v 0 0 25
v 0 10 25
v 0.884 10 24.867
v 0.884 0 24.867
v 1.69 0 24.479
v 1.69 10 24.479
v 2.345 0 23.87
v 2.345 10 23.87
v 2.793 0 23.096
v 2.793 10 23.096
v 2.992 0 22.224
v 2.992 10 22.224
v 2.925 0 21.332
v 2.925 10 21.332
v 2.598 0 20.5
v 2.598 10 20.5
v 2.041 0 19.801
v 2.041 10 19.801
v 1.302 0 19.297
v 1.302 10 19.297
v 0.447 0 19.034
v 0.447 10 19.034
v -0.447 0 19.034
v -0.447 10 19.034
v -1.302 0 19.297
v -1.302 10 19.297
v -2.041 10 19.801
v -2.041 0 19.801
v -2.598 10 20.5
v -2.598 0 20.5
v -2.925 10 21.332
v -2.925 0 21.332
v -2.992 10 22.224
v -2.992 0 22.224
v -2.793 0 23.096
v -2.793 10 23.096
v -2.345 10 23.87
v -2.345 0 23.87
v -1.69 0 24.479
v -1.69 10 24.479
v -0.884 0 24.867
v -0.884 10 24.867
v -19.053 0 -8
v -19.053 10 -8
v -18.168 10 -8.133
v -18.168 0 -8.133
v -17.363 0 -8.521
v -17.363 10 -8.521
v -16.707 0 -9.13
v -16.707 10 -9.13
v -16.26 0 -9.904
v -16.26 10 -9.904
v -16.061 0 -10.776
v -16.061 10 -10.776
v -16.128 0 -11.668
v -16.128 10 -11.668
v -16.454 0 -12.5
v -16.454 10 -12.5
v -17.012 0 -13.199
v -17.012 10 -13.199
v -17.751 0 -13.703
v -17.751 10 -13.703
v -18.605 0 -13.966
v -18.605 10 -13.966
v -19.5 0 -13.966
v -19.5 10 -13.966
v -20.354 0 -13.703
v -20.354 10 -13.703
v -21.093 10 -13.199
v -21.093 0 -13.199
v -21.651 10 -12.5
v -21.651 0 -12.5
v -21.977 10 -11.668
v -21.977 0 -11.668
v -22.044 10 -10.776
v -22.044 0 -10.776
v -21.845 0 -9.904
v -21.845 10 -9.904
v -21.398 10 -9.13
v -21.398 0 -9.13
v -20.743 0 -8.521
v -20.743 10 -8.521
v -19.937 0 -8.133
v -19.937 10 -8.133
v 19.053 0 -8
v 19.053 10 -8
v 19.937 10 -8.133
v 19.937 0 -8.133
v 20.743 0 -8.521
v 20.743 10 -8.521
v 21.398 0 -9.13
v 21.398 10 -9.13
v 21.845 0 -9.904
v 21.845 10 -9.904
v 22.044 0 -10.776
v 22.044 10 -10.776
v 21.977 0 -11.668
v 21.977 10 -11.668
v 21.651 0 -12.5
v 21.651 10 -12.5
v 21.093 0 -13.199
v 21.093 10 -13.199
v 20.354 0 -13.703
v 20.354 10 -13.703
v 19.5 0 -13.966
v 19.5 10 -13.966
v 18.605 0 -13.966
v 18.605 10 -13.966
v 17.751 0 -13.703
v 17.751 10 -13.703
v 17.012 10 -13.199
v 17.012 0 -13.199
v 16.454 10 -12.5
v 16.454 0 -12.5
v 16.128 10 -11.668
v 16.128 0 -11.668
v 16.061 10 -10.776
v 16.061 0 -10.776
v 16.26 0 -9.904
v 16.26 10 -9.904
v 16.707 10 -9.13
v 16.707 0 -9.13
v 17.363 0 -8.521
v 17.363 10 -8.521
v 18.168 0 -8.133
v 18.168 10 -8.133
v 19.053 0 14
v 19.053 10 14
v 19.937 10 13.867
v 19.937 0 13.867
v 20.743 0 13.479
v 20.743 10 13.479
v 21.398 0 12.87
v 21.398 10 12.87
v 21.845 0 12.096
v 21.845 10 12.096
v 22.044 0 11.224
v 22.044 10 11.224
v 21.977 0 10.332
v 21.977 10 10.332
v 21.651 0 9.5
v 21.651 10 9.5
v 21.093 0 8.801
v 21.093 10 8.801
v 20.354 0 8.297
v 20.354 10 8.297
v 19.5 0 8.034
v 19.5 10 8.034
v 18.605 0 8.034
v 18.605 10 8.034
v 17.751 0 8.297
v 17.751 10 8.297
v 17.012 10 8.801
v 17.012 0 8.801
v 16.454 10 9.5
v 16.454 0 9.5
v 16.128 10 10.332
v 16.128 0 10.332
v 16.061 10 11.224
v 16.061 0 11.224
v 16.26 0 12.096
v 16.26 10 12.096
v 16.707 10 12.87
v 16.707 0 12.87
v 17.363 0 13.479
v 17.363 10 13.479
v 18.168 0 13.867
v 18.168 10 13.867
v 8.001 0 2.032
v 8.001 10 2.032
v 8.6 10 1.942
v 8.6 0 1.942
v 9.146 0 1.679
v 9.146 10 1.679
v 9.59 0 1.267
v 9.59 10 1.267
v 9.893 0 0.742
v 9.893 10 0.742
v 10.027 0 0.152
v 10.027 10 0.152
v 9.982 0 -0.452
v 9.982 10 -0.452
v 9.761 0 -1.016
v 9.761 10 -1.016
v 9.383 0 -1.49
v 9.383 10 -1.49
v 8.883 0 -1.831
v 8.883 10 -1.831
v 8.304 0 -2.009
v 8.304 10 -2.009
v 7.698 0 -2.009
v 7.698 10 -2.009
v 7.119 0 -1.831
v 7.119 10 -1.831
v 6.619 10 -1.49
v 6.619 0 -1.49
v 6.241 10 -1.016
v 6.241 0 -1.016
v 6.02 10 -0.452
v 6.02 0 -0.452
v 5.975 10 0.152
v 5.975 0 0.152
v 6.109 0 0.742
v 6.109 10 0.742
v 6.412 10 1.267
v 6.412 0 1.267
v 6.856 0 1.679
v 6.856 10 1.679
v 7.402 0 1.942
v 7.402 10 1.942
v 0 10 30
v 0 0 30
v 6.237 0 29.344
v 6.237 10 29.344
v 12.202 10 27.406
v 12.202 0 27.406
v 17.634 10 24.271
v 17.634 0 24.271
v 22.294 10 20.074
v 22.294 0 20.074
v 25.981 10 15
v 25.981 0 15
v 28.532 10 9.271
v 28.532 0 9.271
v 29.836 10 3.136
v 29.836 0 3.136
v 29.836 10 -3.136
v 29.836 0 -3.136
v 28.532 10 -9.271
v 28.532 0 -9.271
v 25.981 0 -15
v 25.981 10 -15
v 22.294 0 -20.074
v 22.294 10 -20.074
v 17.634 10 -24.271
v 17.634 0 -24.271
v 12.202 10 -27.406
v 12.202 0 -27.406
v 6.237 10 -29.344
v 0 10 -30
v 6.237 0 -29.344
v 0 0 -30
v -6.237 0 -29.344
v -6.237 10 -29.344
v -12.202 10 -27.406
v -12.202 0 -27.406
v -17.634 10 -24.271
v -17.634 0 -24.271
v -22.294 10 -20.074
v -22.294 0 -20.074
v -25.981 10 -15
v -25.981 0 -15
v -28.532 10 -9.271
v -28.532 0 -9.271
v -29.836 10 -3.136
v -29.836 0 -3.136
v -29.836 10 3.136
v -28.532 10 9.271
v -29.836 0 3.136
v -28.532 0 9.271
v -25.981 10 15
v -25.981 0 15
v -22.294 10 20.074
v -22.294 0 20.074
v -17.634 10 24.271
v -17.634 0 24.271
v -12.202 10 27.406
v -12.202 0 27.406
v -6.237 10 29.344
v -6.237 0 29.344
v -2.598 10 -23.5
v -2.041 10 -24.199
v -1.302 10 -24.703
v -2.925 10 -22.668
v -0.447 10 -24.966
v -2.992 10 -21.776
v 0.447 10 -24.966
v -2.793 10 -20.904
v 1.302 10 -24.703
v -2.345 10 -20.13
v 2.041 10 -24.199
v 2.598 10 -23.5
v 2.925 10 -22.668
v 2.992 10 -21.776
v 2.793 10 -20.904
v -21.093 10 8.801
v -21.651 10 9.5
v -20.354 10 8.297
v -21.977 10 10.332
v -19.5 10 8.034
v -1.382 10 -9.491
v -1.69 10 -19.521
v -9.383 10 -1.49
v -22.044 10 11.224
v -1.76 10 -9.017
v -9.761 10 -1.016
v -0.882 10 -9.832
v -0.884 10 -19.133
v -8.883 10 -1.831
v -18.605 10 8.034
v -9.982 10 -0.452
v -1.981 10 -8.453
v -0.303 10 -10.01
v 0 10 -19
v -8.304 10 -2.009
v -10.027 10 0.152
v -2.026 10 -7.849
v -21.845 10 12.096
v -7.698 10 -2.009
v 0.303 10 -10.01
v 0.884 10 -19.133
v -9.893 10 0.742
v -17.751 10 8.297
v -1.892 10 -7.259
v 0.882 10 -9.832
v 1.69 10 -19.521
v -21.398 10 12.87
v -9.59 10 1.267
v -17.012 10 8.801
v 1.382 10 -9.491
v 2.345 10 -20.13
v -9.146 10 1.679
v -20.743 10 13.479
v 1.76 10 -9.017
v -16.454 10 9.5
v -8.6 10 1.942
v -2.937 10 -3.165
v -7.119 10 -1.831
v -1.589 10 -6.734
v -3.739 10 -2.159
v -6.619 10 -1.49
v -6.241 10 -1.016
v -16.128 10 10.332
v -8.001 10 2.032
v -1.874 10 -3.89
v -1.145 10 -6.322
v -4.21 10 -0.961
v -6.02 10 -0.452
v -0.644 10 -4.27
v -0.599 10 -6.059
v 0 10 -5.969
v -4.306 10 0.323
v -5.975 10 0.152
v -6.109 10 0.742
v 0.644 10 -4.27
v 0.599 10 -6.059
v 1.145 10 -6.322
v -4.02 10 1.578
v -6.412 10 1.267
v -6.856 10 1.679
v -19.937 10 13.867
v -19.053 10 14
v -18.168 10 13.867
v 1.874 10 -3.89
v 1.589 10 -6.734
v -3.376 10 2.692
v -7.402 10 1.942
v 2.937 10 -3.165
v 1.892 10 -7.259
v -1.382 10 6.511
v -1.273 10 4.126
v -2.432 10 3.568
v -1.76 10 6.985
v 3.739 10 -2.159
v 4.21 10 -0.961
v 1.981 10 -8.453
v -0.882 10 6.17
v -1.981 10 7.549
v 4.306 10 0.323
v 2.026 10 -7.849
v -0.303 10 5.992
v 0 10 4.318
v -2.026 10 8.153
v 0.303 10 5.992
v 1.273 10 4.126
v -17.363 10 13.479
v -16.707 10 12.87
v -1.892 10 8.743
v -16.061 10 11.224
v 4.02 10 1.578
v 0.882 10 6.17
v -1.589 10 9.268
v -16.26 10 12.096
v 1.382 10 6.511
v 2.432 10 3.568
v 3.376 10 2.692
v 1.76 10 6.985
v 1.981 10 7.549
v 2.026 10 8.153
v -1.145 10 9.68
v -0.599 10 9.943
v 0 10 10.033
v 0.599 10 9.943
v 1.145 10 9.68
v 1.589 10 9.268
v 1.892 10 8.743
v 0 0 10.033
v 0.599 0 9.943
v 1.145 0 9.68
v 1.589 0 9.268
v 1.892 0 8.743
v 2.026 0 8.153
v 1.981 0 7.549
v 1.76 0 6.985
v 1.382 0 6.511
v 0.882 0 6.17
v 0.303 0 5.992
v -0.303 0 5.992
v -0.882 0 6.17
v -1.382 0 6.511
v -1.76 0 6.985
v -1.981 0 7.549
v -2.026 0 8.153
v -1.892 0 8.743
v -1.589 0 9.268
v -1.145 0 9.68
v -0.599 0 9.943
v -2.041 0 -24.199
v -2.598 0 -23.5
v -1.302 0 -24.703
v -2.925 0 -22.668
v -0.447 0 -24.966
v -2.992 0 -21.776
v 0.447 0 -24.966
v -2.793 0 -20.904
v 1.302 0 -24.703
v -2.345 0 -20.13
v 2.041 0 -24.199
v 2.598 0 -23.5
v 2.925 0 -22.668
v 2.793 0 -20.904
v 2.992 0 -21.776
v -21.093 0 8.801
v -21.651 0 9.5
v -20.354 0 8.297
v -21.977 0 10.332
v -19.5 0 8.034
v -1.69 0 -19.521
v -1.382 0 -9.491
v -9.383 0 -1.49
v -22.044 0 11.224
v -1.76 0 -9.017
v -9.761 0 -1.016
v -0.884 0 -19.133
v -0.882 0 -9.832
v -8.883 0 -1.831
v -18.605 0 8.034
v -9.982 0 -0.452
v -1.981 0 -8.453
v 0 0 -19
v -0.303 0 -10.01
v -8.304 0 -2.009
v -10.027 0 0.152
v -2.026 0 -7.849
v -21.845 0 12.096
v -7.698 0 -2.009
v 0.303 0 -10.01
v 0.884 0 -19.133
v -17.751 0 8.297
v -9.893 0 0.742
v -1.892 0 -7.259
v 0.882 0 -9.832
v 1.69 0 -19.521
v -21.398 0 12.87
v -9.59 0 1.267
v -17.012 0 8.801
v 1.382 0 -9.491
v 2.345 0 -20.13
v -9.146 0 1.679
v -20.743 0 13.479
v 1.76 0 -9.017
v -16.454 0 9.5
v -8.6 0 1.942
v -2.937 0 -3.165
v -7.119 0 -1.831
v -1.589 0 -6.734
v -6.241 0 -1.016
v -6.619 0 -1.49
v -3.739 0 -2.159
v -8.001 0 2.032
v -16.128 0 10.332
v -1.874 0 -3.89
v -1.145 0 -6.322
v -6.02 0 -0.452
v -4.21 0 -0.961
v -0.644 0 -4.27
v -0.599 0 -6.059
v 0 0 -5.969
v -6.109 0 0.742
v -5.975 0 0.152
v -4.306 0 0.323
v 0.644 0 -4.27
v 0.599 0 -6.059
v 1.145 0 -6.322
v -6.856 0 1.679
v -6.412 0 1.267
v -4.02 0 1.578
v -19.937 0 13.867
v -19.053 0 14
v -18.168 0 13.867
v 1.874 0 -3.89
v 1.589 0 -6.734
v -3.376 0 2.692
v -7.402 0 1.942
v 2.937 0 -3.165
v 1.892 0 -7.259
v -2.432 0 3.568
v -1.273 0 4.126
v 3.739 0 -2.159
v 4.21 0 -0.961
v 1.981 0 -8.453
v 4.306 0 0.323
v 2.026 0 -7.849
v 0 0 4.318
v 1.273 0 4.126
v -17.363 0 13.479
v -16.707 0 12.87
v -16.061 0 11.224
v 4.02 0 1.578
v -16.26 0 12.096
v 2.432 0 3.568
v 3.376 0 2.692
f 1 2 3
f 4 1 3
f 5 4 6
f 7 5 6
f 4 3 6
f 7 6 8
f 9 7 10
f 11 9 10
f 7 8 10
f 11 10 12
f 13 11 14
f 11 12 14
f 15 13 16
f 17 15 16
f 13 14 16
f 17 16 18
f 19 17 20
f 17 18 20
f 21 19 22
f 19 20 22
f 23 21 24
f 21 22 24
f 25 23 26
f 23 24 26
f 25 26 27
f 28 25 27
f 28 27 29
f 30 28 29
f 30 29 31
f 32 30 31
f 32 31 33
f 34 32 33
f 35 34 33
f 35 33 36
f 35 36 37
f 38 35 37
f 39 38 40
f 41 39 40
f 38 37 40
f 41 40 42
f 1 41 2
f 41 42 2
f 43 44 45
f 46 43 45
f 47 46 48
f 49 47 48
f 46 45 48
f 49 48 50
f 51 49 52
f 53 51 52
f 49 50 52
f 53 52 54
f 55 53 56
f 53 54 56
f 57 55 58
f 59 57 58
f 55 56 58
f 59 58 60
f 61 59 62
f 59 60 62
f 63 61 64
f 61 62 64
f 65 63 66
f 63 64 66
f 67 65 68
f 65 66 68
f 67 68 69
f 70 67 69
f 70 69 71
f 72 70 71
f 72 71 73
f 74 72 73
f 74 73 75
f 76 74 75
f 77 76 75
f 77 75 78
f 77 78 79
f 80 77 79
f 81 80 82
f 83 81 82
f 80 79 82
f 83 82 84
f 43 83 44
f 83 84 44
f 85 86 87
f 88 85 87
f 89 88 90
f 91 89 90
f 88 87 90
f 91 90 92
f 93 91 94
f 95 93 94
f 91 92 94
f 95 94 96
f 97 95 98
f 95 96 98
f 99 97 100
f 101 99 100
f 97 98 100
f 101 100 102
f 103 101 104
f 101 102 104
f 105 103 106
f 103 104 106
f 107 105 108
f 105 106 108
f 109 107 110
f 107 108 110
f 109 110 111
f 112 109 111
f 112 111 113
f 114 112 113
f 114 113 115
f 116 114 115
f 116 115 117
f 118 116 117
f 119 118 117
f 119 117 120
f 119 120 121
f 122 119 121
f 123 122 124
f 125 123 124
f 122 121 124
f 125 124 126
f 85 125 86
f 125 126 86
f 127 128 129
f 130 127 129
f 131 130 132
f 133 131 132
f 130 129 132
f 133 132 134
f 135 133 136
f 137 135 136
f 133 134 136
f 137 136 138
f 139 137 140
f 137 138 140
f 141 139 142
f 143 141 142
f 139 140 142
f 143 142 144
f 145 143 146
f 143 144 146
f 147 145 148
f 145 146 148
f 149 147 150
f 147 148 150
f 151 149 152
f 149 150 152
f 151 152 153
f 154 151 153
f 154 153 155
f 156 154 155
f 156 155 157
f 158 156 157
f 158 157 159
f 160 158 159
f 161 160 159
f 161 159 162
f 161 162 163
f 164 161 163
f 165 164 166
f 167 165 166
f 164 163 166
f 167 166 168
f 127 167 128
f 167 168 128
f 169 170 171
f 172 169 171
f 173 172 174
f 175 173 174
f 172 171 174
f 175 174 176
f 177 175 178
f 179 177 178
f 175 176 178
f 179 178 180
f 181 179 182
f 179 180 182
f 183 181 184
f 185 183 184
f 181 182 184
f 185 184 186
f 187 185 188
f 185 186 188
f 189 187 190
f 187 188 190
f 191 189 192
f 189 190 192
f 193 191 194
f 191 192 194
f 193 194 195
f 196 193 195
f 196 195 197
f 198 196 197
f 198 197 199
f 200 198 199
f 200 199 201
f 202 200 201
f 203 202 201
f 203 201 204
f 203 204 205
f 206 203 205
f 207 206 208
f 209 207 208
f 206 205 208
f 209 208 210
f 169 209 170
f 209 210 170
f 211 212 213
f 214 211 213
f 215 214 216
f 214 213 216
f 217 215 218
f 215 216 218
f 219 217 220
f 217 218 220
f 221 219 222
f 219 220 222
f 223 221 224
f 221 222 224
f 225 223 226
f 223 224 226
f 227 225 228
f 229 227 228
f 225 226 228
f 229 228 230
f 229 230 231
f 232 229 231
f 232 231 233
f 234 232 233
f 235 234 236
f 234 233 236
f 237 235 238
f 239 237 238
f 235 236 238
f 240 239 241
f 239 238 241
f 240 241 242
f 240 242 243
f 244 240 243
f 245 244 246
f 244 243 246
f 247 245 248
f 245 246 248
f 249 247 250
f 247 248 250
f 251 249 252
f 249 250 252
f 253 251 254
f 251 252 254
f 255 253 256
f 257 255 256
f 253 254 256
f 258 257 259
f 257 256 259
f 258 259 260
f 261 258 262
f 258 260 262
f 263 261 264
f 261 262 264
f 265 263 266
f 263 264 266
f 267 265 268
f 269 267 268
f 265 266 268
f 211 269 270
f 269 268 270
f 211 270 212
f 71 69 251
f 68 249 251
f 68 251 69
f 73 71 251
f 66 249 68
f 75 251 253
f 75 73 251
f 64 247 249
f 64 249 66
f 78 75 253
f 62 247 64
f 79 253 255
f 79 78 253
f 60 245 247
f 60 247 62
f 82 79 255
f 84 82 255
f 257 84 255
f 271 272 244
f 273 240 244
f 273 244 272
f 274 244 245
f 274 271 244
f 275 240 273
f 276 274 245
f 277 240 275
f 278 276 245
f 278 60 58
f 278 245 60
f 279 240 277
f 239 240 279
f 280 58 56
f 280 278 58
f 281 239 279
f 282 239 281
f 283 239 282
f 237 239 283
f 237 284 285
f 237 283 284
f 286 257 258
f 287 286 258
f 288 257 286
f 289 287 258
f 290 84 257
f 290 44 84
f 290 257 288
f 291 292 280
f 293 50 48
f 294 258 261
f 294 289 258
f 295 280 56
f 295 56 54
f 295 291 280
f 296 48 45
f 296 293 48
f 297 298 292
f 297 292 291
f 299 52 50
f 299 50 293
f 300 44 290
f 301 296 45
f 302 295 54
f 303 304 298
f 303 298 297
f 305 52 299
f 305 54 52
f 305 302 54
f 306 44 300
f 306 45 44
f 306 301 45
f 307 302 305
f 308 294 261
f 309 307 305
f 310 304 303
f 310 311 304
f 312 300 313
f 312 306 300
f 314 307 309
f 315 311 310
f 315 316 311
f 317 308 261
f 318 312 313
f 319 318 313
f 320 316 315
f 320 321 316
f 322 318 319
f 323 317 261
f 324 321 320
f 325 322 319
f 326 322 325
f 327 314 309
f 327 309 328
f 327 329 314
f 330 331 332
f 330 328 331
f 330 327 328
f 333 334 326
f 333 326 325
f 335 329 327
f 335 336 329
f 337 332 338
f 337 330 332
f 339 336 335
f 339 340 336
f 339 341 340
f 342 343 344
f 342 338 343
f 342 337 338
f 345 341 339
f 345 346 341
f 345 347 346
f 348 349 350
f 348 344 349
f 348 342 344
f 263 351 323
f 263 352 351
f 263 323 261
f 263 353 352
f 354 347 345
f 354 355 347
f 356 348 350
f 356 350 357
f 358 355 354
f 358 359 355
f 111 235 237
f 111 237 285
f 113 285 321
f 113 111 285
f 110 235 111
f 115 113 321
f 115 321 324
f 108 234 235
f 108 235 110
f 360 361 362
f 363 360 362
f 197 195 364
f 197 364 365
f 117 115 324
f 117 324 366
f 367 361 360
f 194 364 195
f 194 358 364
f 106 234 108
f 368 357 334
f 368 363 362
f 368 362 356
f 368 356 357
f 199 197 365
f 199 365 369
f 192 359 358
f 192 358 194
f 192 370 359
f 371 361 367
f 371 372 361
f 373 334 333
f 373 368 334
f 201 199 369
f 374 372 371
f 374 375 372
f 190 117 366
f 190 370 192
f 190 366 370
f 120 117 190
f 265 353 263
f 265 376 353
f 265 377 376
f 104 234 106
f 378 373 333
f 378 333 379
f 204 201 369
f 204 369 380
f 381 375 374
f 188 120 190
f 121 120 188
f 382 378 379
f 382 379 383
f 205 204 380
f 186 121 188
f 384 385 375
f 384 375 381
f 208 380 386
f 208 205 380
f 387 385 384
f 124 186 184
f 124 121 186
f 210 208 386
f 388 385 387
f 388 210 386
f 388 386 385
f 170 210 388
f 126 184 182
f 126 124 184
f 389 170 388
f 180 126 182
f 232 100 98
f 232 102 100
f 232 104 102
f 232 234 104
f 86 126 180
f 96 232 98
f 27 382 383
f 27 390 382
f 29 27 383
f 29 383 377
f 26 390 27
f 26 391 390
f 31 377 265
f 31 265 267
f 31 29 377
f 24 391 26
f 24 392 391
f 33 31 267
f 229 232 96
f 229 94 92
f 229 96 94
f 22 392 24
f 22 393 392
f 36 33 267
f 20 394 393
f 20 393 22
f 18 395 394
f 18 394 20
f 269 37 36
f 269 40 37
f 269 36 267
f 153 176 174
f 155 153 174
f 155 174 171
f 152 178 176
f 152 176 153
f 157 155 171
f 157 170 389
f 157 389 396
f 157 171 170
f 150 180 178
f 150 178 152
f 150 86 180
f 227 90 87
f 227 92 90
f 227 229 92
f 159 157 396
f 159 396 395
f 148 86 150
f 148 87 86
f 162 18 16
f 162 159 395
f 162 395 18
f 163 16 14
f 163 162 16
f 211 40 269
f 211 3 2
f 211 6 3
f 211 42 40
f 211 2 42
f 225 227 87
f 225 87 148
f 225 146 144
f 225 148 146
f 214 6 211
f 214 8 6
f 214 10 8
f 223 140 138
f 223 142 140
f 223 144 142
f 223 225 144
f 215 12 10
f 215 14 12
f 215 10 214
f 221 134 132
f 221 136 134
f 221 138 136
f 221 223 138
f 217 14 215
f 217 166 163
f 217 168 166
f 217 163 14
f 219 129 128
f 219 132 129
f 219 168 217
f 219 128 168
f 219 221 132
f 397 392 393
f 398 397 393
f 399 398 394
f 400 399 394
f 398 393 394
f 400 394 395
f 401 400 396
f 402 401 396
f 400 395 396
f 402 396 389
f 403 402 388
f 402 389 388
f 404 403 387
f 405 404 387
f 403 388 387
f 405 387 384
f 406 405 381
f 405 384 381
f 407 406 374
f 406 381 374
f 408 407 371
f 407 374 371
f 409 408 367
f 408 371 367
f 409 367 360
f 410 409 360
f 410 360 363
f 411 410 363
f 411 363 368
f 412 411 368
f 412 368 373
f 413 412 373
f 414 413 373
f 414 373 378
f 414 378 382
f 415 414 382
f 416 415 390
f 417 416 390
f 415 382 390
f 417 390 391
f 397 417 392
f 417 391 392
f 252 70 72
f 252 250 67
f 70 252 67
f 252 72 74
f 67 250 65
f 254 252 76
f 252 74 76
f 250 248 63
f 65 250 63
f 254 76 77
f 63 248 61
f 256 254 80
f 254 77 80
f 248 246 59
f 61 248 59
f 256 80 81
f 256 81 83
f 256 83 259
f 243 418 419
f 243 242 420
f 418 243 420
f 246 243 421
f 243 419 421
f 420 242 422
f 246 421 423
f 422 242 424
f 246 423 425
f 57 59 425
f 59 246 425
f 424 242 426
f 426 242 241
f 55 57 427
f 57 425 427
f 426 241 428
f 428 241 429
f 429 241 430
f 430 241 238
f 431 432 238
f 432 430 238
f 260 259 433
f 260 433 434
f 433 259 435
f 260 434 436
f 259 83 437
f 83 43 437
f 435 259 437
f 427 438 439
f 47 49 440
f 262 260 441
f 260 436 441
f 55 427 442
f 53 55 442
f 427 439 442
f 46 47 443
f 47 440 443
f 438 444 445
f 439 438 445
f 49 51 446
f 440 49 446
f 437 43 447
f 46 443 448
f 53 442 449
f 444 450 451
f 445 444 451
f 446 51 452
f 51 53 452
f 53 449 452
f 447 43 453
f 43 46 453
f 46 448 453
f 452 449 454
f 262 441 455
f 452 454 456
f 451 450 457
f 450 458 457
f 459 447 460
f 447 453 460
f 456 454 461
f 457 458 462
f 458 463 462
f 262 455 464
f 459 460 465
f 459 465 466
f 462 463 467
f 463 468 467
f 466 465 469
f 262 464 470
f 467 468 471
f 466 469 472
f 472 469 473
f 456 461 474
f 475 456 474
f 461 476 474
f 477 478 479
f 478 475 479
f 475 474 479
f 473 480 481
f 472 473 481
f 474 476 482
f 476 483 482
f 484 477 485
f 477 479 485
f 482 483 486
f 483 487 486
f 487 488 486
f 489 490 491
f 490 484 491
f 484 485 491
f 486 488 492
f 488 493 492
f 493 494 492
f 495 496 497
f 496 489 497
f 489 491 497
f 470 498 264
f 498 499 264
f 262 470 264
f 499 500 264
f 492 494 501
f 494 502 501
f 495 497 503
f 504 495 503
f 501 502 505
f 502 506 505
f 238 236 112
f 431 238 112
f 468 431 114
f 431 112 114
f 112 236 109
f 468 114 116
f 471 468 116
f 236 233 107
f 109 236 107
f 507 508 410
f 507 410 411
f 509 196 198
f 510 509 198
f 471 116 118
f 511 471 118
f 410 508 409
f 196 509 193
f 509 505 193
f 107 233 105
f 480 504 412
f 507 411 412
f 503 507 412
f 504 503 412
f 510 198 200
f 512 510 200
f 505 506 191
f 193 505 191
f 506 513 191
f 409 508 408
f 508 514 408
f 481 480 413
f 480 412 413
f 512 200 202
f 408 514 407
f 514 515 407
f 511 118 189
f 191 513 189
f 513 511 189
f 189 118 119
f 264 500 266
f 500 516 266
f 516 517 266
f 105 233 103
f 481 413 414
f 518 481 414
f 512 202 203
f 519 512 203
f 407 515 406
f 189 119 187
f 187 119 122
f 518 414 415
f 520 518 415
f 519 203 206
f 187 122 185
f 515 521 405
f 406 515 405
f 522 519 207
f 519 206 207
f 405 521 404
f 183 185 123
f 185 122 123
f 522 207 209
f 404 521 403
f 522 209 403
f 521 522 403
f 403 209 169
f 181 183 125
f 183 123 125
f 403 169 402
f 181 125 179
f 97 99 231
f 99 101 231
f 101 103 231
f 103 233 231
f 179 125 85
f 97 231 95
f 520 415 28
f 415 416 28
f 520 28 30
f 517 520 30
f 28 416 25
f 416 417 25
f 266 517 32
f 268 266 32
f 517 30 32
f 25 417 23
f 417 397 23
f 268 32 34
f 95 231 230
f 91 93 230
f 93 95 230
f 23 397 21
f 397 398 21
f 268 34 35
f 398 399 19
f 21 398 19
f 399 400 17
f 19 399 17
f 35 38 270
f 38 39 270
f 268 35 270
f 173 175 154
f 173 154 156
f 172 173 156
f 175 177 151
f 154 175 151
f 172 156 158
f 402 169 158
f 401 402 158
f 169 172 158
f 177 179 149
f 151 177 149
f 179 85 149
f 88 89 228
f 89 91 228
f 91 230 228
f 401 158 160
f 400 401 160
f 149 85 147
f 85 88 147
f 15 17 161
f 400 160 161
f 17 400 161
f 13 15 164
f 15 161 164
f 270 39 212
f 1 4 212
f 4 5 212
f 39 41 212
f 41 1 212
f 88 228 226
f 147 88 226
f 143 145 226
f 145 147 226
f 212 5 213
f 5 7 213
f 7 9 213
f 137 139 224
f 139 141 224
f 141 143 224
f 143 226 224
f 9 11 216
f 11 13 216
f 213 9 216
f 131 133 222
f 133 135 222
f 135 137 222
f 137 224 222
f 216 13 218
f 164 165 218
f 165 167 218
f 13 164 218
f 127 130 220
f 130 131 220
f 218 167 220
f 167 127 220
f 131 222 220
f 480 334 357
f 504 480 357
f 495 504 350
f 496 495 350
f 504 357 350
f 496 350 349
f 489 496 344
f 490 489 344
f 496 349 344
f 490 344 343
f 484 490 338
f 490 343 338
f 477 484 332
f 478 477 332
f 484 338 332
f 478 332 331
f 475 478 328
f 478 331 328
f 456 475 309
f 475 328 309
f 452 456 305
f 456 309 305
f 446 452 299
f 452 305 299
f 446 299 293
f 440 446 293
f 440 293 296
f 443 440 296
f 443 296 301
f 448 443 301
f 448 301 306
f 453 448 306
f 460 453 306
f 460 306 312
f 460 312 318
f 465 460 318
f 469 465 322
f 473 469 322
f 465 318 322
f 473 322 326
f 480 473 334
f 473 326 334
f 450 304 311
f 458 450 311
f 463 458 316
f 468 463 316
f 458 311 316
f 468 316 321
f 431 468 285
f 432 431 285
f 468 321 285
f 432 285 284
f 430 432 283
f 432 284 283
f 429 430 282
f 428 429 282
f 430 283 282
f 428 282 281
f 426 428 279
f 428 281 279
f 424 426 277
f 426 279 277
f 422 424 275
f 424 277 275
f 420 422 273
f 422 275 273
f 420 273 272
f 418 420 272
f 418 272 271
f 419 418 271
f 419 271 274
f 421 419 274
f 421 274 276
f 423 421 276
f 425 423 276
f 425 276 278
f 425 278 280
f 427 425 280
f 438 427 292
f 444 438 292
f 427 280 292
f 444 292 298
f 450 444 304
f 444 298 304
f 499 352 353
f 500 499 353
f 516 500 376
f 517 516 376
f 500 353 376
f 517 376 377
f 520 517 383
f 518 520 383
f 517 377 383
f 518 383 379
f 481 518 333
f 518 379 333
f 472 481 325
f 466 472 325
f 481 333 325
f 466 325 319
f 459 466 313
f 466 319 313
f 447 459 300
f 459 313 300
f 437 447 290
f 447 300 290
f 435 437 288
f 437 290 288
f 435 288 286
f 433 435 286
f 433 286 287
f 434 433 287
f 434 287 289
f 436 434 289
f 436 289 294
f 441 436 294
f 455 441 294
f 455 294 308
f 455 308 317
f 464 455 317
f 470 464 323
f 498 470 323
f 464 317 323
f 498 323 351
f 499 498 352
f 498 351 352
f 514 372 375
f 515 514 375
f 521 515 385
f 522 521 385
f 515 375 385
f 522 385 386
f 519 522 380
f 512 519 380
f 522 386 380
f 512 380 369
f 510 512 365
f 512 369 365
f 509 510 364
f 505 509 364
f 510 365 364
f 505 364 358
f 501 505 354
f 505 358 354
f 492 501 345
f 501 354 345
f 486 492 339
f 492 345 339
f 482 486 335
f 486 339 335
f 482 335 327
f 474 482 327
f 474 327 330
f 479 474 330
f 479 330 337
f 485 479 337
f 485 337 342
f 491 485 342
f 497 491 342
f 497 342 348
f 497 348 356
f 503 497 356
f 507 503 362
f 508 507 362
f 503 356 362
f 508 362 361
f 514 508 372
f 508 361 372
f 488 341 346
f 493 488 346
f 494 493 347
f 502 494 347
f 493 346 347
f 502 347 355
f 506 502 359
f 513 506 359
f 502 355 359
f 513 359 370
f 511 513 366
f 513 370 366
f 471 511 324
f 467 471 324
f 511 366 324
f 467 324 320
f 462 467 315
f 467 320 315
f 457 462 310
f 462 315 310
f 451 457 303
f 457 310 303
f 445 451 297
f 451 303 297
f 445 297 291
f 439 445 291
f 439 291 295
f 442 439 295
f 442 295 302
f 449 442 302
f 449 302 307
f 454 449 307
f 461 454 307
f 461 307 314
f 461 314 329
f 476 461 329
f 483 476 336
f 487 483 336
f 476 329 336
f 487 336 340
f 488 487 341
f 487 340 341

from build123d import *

# Parameters (mm, degrees)
SKETCH1_R           = 30
BOSS_EXTRUDE1_DEPTH = 10
SKETCH2_R           = 3
CUT_EXTRUDE1_DEPTH  = 10
SKETCH4_R           = 4.318
SKETCH4_R_2         = 2.032
CUT_EXTRUDE2_DEPTH  = 10


with BuildPart() as part:
    # Sketch1 → Boss-Extrude1 (new body)
    with BuildSketch(Plane(origin=(0, 0, 0), x_dir=(1, 0, 0), z_dir=(0, 1, 0))):
        with Locations(Location((0, 0, 0), (0, 0, 270))):
            Circle(SKETCH1_R)
    extrude(amount=BOSS_EXTRUDE1_DEPTH)

    # Sketch2 → Cut-Extrude1 (cut)
    with BuildSketch(Plane(origin=(0, 10, 0), x_dir=(1, 0, 0), z_dir=(0, 1, 0))):
        with Locations(Location((0, -22, 0), (0, 0, 270))):
            Circle(SKETCH2_R)
        with Locations(Location((-19.052558883, -11, 0), (0, 0, 270))):
            Circle(SKETCH2_R)
        with Locations(Location((-19.052558883, 11, 0), (0, 0, 270))):
            Circle(SKETCH2_R)
        with Locations(Location((0, 22, 0), (0, 0, 270))):
            Circle(SKETCH2_R)
        with Locations(Location((19.052558883, 11, 0), (0, 0, 270))):
            Circle(SKETCH2_R)
        with Locations(Location((19.052558883, -11, 0), (0, 0, 270))):
            Circle(SKETCH2_R)
    extrude(amount=-CUT_EXTRUDE1_DEPTH, mode=Mode.SUBTRACT)

    # Sketch4 → Cut-Extrude2 (cut)
    with BuildSketch(Plane(origin=(0, 10, 0), x_dir=(1, 0, 0), z_dir=(0, 1, 0))):
        with Locations(Location((0, 0, 0), (0, 0, 270))):
            Circle(SKETCH4_R)
        with Locations(Location((0, -8.001, 0), (0, 0, 270))):
            Circle(SKETCH4_R_2)
        with Locations(Location((-8.001, 0, 0), (0, 0, 270))):
            Circle(SKETCH4_R_2)
        with Locations(Location((0, 8.001, 0), (0, 0, 270))):
            Circle(SKETCH4_R_2)
        with Locations(Location((8.001, 0, 0), (0, 0, 270))):
            Circle(SKETCH4_R_2)
    extrude(amount=-CUT_EXTRUDE2_DEPTH, mode=Mode.SUBTRACT)


solid = part.part
